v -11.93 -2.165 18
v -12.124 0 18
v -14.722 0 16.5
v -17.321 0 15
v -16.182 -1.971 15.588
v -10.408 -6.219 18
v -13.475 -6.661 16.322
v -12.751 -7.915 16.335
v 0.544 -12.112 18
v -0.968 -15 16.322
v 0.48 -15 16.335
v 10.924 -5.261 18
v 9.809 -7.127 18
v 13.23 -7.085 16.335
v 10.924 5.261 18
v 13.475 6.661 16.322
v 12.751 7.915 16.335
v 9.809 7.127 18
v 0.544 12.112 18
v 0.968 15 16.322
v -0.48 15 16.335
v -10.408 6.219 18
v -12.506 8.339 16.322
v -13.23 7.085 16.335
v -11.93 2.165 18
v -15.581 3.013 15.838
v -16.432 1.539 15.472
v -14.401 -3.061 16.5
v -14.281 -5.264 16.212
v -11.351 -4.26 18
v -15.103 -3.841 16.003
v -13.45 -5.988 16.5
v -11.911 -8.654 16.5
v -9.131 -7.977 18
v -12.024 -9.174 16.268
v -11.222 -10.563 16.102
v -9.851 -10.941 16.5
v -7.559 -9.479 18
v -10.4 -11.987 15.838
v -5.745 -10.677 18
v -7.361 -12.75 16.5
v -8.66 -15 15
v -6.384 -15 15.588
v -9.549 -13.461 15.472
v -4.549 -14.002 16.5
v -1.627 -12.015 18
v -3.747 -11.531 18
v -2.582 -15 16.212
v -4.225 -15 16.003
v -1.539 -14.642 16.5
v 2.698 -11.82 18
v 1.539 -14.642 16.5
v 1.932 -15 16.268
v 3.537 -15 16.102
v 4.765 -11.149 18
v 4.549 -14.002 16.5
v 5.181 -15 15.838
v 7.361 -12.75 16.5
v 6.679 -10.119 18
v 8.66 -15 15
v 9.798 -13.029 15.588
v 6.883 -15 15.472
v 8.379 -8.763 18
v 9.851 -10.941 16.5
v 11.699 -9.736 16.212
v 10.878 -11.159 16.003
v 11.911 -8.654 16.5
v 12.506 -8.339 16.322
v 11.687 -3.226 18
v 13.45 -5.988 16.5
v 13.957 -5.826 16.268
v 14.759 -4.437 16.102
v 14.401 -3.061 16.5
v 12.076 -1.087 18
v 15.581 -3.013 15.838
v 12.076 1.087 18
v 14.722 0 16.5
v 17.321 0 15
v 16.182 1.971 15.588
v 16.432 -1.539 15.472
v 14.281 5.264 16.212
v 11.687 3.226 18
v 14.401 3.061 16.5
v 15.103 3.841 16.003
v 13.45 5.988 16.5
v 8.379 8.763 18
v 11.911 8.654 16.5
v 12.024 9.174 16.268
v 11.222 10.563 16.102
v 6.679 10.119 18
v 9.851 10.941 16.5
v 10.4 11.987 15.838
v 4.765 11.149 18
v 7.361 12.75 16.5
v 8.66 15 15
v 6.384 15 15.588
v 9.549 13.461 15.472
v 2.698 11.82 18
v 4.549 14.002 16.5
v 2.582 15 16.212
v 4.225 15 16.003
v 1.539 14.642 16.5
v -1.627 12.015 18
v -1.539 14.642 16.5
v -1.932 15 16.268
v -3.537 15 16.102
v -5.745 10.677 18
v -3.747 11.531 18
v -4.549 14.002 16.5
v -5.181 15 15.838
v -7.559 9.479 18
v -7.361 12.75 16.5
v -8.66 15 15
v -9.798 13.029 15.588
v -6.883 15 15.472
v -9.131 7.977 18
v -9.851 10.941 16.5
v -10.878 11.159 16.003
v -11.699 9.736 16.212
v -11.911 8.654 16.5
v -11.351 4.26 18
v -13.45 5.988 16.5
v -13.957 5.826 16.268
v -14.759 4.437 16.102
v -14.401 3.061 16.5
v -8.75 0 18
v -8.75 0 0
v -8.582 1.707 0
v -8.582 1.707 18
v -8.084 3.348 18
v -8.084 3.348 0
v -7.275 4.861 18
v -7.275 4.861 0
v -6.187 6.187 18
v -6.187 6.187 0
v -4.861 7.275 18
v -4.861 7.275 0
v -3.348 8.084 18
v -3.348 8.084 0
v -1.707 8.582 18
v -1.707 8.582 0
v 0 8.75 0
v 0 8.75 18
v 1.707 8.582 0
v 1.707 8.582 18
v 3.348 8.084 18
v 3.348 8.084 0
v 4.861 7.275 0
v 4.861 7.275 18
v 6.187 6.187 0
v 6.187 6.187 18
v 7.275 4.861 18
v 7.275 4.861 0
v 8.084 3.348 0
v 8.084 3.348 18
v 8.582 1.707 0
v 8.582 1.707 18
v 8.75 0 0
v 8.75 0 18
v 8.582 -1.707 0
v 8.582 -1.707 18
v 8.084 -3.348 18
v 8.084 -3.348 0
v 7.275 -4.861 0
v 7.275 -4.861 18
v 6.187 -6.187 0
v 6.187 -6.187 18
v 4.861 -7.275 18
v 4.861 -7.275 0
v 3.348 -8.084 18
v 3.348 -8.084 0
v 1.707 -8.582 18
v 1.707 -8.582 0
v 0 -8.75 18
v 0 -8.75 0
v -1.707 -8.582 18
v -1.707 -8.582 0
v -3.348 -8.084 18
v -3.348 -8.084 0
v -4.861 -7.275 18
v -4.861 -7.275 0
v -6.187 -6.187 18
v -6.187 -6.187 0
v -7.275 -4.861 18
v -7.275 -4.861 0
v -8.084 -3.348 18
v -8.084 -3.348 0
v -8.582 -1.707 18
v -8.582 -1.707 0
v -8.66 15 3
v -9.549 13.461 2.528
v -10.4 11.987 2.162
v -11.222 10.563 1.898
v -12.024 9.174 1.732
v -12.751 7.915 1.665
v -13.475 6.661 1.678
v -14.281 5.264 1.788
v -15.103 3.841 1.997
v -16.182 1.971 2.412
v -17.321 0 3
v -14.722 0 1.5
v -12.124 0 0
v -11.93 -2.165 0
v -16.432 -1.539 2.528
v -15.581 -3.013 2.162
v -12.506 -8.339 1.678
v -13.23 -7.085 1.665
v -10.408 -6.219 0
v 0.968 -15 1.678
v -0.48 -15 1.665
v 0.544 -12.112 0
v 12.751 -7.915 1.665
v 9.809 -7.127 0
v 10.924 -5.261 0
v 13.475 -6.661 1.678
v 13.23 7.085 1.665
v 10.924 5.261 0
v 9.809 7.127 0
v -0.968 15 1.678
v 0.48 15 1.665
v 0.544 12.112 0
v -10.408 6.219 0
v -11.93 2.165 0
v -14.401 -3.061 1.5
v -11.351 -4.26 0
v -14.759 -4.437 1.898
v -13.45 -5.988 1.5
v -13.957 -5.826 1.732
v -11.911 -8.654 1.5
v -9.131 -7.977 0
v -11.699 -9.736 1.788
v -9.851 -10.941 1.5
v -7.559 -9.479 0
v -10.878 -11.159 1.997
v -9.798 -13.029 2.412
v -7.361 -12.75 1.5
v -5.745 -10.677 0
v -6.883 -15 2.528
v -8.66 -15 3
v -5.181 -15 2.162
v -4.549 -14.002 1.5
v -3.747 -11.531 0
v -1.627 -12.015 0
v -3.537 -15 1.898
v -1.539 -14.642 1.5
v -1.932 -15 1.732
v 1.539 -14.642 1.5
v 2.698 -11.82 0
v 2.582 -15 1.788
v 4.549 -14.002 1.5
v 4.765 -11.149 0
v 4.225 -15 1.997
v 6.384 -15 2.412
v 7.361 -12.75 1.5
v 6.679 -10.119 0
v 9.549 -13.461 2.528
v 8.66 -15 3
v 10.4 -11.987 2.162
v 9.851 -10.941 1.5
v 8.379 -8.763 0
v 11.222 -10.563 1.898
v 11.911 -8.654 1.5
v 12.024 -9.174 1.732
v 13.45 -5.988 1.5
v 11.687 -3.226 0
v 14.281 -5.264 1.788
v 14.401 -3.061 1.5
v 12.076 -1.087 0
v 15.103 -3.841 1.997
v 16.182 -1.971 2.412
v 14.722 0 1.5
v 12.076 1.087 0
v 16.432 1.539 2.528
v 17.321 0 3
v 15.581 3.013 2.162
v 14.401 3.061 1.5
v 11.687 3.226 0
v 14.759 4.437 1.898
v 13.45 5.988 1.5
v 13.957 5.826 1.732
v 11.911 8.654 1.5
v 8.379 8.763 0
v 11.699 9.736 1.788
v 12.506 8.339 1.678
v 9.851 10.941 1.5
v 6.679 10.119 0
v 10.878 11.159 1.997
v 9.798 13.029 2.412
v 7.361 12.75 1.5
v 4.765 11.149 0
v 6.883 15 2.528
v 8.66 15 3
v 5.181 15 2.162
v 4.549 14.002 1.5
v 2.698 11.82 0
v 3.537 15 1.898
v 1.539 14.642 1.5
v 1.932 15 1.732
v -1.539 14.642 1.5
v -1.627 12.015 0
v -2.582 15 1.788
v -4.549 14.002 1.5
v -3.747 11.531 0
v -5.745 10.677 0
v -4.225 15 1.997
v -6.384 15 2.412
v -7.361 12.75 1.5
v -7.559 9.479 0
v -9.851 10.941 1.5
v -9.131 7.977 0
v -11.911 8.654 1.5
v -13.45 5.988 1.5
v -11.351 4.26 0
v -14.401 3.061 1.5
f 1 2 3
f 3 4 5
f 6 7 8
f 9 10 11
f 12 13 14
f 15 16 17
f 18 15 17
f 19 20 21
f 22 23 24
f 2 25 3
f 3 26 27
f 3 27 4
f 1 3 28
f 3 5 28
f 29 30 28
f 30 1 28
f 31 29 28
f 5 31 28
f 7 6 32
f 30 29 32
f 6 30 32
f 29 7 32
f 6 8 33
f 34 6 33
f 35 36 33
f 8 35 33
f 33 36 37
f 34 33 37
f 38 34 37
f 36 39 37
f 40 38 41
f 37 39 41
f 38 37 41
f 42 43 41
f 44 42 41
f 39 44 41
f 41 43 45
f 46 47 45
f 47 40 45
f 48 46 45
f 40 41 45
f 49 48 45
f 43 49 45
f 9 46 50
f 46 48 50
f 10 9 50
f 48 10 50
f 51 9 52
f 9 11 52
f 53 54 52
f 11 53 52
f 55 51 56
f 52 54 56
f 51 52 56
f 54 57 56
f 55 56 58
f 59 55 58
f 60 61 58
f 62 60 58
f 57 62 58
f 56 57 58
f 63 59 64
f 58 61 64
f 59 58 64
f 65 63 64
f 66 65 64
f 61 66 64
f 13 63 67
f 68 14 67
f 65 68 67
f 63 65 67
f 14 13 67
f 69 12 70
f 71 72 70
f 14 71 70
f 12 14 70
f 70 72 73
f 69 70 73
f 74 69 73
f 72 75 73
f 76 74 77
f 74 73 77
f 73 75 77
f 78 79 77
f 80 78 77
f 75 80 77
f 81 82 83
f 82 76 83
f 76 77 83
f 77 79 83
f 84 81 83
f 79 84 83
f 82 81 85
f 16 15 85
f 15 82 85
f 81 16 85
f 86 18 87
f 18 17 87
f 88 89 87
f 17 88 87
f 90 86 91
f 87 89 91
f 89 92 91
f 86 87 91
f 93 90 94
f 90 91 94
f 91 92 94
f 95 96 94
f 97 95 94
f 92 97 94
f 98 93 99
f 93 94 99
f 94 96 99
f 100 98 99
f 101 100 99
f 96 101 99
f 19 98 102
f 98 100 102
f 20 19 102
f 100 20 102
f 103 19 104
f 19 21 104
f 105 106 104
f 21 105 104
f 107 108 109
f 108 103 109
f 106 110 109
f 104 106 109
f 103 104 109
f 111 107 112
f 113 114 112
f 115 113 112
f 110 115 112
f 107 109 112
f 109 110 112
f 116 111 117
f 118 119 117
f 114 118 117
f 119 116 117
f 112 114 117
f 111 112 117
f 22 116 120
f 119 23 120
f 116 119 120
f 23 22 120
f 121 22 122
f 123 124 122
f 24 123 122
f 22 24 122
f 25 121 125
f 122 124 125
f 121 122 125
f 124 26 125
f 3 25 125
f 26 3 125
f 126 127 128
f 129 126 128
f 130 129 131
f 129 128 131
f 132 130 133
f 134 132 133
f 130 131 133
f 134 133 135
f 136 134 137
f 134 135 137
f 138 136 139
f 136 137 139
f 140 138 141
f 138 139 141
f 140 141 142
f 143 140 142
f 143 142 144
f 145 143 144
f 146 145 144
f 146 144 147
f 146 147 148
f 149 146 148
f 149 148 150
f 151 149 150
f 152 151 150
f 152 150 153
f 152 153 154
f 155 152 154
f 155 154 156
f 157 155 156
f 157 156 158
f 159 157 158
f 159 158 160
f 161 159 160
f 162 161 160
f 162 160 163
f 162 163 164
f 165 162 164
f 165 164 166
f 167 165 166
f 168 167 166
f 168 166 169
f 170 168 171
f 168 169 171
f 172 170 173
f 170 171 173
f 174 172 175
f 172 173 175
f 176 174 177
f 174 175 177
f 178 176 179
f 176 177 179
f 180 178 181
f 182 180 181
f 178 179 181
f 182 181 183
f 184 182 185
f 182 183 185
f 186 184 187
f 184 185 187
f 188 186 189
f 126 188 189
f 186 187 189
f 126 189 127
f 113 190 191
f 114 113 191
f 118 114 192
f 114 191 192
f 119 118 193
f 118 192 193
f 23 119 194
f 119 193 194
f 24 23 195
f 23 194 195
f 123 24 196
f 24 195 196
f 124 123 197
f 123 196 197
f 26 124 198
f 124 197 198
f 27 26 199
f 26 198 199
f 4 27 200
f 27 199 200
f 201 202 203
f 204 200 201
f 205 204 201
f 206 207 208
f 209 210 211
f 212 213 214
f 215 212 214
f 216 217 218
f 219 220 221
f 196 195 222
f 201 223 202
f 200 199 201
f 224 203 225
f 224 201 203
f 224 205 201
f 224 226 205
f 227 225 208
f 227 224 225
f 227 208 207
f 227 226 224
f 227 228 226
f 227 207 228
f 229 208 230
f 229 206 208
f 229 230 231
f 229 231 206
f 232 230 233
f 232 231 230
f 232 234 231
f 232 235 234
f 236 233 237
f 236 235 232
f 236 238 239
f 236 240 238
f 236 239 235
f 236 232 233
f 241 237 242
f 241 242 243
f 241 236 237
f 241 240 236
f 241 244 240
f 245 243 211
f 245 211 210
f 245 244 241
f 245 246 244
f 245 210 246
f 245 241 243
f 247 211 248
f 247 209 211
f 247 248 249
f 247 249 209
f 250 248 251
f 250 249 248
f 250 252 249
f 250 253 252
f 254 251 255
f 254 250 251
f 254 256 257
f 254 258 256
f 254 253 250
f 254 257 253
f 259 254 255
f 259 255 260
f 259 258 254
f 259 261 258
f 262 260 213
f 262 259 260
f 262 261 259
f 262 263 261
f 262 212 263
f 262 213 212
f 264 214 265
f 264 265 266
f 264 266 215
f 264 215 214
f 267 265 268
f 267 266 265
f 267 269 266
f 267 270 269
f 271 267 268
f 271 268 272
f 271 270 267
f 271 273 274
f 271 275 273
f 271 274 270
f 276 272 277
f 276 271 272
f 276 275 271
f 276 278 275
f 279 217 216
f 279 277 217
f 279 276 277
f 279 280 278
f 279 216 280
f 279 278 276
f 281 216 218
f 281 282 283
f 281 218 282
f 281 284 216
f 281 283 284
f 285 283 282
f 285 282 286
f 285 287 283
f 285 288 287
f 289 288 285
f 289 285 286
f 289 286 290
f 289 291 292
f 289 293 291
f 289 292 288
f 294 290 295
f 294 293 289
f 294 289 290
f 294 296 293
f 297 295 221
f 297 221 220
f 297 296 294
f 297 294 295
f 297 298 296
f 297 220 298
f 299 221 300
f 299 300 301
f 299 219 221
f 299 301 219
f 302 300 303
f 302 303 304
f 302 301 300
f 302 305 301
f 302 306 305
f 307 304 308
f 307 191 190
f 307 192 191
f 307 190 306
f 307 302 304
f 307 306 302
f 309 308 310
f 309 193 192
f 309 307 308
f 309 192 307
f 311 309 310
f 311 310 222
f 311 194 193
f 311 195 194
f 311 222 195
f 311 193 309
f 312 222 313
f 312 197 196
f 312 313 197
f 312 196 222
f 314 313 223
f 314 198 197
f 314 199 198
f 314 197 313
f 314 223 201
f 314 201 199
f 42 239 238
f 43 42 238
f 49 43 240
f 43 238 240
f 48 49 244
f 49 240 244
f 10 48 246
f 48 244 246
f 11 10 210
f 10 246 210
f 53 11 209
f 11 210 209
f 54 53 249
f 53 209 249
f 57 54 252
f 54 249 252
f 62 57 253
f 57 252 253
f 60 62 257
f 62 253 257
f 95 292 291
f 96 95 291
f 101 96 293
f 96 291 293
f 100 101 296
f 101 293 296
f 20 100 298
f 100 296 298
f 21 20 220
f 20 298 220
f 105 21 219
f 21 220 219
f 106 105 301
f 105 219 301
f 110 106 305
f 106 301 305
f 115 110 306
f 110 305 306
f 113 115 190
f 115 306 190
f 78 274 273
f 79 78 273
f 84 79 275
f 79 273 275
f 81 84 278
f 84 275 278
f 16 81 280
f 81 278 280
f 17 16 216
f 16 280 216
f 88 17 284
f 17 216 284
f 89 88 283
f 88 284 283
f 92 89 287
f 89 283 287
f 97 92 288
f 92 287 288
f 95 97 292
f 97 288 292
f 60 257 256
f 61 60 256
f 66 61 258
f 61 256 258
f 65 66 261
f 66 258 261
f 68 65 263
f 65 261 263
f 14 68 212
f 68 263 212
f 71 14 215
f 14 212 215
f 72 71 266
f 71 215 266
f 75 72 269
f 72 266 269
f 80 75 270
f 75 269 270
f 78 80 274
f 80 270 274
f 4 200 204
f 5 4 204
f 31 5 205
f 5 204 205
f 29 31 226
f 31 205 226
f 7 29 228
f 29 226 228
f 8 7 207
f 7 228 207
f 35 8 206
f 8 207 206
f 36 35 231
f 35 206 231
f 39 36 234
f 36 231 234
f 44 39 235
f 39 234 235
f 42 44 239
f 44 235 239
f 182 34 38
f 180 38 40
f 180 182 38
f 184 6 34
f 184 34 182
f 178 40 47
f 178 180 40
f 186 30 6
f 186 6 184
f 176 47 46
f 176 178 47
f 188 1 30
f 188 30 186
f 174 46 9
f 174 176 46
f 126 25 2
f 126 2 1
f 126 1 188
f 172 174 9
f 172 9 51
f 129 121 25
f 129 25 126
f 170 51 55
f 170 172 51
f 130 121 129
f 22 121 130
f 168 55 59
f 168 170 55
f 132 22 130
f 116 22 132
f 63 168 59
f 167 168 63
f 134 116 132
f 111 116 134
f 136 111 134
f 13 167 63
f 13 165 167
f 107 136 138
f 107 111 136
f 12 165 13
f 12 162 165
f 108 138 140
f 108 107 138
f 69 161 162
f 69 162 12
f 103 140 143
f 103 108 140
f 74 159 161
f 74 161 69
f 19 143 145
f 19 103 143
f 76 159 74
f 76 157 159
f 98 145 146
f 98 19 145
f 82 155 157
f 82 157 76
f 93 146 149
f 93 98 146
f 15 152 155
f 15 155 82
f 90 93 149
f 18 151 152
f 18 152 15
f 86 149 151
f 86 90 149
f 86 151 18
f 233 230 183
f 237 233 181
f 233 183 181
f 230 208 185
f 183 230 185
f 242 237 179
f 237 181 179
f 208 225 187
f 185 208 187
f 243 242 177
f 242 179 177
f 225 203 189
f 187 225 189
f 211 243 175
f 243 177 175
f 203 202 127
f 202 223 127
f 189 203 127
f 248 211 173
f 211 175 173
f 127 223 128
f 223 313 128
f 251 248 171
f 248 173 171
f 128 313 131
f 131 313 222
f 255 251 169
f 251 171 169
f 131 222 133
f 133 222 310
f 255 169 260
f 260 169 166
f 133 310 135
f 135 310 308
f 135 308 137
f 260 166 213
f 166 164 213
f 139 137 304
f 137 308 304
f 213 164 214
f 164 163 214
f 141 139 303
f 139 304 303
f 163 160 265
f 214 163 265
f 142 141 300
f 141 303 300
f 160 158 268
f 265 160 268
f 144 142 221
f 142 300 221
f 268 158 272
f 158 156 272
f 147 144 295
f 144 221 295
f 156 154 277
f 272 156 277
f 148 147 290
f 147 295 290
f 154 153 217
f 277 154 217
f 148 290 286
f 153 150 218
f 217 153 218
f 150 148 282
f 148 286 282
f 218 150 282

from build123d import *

# Parameters (mm, degrees)
EXTRUDE_1_DEPTH         = 18
HOLE_WIZARD_M20_1_D     = 17.5
HOLE_WIZARD_M20_1_DEPTH = 47.5
HOLE_WIZARD_M20_1_TIP   = 5.257530416


with BuildPart() as part:
    # 草图1 → 拉伸1 (new body)
    with BuildSketch(Plane.XY):
        Polygon((17.320508076, 0), (8.660254038, 15), (-8.660254038, 15), (-17.320508076, 0), (-8.660254038, -15), (8.660254038, -15), align=None)
    extrude(amount=EXTRUDE_1_DEPTH)

    # 草图2 → 切除-旋转1 (revolve, cut)
    with BuildSketch(Plane(origin=(0, 0, 0), x_dir=(1, 0, 0), z_dir=(0, 1, 0)), mode=Mode.PRIVATE) as cut_revolve_1_sk:
        Polygon((1.900444705, 5.902777738), (17.320508076, -3), (20.281011983, 2.127743183), align=None)
        Polygon((17.320508076, -15), (20.281011983, -20.127743183), (1.900444705, -23.902777738), align=None)
    revolve(cut_revolve_1_sk.sketch.rotate(Axis((0, 0, -13.306273389), (0, 0, 1)), 180), axis=Axis((0, 0, -13.306273389), (0, 0, 1)), mode=Mode.SUBTRACT)

    # M20 螺纹孔1
    with Locations(Plane.XY.offset(18)):
        with Locations((0, 0)):
            Hole(HOLE_WIZARD_M20_1_D / 2, depth=HOLE_WIZARD_M20_1_DEPTH)
            with Locations((0, 0, -(HOLE_WIZARD_M20_1_DEPTH + HOLE_WIZARD_M20_1_TIP / 2))):  # 118° drill point
                Cone(0, HOLE_WIZARD_M20_1_D / 2, HOLE_WIZARD_M20_1_TIP, mode=Mode.SUBTRACT)


solid = part.part
